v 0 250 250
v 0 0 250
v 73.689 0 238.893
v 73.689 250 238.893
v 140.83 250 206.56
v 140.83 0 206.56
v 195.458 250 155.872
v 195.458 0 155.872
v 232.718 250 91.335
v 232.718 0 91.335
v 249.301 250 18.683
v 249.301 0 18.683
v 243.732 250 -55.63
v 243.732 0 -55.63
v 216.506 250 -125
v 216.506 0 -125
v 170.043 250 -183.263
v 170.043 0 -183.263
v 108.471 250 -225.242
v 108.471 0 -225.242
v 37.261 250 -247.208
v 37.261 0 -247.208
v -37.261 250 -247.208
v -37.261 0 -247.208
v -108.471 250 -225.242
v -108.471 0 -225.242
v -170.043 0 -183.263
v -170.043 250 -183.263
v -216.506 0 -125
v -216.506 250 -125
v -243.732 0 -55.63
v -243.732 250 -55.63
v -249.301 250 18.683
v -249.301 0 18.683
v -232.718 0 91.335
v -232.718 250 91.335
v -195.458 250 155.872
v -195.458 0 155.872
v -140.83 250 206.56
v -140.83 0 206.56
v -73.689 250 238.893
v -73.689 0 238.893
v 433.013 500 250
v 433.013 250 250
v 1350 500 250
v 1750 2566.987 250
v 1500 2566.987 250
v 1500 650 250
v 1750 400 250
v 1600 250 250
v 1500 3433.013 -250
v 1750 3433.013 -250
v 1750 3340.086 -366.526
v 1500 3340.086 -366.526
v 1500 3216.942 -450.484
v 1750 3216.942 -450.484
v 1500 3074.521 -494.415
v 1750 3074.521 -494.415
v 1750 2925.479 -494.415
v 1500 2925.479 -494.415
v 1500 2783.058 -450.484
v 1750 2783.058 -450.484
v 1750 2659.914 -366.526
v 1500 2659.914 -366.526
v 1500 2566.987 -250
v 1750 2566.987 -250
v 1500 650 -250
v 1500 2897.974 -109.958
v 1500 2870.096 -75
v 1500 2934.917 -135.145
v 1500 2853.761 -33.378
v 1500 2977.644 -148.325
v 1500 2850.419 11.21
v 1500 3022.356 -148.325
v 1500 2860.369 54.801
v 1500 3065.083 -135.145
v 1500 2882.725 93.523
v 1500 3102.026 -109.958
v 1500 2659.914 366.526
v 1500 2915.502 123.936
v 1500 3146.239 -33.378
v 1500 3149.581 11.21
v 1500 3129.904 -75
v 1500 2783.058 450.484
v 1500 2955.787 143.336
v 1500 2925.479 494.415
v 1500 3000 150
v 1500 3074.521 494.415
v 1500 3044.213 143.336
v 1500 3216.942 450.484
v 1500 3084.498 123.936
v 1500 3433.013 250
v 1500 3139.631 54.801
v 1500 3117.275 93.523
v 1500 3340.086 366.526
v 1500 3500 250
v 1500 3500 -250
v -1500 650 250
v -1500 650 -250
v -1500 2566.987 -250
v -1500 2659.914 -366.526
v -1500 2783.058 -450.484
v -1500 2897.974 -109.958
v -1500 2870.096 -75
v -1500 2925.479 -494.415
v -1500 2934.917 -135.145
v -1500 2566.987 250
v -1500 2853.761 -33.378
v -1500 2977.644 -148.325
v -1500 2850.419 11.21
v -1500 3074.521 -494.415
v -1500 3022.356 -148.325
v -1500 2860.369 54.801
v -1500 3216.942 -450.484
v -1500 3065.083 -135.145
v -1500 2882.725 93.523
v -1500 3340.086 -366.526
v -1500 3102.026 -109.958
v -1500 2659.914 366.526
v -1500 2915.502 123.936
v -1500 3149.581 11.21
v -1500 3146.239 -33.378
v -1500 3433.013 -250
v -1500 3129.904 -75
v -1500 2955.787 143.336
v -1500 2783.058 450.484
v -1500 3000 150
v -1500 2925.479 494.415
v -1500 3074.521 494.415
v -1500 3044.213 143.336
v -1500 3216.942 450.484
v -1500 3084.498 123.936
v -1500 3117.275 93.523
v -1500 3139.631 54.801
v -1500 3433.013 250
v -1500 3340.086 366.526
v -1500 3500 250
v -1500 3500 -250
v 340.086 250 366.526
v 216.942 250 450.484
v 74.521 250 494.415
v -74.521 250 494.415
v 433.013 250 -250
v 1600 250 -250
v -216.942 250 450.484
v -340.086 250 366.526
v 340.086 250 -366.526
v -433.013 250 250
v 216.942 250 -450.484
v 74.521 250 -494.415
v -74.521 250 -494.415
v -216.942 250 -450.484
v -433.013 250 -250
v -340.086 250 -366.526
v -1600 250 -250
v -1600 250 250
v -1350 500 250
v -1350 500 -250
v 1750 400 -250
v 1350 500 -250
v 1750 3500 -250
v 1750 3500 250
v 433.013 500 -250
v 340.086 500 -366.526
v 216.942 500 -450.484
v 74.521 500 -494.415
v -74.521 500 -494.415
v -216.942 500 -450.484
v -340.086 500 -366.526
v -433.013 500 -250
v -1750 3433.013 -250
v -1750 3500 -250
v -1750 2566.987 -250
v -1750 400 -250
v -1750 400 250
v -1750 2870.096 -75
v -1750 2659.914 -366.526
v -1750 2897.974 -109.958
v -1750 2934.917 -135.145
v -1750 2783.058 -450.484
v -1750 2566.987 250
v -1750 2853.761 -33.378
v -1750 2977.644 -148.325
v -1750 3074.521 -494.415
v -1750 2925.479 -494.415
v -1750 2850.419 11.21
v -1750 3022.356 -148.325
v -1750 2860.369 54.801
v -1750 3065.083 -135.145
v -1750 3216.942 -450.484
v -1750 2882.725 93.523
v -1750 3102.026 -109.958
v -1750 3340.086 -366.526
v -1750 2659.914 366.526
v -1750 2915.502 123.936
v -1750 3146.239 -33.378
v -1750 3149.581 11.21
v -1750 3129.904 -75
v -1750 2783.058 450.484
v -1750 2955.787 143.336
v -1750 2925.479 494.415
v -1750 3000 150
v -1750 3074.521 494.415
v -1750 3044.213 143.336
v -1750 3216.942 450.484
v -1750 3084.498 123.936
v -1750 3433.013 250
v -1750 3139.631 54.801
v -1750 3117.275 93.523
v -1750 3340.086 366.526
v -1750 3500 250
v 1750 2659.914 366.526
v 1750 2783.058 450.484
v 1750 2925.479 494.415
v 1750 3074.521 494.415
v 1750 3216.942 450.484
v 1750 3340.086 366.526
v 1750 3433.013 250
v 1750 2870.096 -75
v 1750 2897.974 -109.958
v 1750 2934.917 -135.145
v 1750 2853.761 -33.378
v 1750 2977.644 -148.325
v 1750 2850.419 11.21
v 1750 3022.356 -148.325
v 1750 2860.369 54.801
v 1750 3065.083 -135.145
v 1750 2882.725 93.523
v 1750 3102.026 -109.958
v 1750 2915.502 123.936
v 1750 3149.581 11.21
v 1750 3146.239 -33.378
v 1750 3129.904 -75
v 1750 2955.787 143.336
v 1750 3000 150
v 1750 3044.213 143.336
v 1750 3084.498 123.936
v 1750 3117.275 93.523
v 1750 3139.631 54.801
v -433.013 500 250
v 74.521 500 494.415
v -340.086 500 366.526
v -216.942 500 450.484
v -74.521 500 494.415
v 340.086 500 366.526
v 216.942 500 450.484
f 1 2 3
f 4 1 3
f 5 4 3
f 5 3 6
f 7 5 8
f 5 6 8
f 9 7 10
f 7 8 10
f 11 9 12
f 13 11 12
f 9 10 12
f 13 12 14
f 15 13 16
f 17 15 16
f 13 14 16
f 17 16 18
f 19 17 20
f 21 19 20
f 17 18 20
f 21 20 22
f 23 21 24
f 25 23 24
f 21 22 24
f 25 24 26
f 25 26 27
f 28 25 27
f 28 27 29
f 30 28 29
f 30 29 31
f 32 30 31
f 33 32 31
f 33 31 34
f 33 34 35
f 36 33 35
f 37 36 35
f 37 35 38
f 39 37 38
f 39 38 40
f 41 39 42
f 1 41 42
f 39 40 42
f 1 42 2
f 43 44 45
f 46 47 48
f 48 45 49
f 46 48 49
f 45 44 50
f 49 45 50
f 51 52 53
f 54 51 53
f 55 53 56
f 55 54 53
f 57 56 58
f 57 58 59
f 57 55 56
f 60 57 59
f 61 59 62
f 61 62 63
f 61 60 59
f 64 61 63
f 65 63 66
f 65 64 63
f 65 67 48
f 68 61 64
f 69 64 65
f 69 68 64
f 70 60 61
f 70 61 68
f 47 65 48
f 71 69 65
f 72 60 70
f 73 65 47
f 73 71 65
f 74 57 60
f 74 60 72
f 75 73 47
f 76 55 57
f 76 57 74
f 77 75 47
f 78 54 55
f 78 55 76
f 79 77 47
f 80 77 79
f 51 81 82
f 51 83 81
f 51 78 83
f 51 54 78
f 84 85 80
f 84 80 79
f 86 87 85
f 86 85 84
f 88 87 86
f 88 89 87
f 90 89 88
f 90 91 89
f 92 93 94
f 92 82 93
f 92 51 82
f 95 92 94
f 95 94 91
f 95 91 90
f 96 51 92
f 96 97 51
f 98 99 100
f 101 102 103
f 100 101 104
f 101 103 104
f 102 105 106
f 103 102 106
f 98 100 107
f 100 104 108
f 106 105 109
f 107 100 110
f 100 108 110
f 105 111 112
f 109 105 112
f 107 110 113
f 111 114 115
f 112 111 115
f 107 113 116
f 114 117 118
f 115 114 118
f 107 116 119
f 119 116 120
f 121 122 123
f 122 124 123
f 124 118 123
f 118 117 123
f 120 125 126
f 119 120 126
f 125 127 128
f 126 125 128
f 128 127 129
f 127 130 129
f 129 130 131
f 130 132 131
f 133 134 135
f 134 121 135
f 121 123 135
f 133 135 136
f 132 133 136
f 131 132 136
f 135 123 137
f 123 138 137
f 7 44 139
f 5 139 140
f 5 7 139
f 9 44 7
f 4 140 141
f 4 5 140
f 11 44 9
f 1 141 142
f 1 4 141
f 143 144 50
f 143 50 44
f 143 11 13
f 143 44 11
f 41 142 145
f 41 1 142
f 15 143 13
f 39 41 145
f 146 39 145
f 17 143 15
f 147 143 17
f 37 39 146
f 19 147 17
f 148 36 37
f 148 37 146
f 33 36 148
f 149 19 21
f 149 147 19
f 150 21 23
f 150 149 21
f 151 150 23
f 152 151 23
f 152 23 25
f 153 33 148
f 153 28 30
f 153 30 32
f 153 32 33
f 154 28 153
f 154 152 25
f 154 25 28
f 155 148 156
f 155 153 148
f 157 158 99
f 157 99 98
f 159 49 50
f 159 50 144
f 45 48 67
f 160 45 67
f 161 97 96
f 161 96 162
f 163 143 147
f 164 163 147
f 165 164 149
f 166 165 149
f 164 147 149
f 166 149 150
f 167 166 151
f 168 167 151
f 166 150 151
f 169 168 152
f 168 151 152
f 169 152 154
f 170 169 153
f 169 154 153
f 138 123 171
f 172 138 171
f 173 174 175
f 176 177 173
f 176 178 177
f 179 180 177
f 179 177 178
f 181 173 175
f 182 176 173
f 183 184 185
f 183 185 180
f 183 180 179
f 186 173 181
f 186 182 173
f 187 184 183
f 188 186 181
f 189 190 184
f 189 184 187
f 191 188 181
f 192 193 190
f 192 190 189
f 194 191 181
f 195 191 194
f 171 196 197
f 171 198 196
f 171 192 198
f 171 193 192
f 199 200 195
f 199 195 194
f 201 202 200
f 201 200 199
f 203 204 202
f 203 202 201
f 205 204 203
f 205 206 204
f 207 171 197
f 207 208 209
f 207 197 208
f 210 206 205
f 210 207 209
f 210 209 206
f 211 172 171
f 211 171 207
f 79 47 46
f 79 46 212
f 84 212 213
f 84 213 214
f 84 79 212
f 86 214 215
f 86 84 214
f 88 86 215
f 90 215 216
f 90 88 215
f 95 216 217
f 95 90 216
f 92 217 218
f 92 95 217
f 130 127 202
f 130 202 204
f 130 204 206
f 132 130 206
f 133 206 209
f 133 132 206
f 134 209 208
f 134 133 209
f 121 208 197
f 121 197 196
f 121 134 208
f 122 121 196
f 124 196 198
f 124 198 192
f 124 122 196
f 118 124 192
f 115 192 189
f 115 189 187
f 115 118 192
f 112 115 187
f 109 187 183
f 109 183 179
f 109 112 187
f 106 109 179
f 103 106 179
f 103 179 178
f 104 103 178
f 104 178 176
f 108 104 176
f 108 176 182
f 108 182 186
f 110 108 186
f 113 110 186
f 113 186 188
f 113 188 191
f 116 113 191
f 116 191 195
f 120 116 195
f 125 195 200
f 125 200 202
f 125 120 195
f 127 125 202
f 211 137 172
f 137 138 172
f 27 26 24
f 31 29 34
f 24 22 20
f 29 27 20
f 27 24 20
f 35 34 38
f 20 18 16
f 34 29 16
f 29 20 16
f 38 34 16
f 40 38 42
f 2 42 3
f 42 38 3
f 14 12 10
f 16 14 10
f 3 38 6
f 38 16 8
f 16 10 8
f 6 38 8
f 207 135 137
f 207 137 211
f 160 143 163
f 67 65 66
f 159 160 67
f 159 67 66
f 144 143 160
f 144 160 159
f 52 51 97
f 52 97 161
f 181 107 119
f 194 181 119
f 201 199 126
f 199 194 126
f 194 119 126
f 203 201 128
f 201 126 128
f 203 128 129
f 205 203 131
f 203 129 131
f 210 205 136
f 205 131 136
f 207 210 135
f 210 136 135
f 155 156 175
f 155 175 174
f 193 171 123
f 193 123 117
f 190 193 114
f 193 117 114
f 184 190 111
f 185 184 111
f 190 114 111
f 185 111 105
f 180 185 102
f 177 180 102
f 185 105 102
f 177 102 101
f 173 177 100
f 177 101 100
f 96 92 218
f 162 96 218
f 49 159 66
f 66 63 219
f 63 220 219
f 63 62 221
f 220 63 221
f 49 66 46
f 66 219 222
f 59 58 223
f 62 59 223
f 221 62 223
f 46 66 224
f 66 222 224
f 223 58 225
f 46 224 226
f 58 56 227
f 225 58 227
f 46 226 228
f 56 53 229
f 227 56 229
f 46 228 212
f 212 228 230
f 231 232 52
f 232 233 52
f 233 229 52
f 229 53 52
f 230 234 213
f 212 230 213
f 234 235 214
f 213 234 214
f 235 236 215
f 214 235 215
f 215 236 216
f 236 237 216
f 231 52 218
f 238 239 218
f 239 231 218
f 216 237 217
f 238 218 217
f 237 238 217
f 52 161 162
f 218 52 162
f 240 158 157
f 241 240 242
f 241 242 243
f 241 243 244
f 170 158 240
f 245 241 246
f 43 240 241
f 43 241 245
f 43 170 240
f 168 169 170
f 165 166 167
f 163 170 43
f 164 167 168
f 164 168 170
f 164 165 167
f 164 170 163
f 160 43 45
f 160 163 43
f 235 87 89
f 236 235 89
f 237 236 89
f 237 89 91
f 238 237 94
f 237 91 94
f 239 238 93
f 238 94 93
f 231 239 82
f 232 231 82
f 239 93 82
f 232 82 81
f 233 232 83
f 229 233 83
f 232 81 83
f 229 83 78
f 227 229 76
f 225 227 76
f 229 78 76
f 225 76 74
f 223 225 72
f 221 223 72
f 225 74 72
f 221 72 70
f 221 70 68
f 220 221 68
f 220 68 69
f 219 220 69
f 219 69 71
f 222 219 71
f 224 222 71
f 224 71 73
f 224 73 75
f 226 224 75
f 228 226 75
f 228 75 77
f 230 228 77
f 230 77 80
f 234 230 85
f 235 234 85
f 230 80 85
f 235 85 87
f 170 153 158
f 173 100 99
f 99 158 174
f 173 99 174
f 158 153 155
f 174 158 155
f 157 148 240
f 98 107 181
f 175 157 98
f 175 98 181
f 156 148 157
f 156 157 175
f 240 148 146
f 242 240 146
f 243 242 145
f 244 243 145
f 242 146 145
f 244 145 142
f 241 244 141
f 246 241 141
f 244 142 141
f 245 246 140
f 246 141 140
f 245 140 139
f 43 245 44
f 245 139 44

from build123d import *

# Parameters (mm, degrees)
SKETCH1_R           = 250
BOSS_EXTRUDE1_DEPTH = 250
BOSS_EXTRUDE2_DEPTH = 250
SKETCH4_W           = 250
SKETCH4_H           = 500
BOSS_EXTRUDE3_DEPTH = 3250
SKETCH7_R           = 500
BOSS_EXTRUDE4_DEPTH = 250
SKETCH8_R           = 150
CUT_EXTRUDE1_DEPTH  = 250
CHAMFER1_SIZE       = 150


with BuildPart() as part:
    # Sketch1 → Boss-Extrude1 (new body)
    with BuildSketch(Plane(origin=(0, 0, 0), x_dir=(1, 0, 0), z_dir=(0, 1, 0))):
        with Locations(Location((0, 0, 0), (0, 0, 270))):
            Circle(SKETCH1_R)
    extrude(amount=BOSS_EXTRUDE1_DEPTH)

    # Sketch2 → Boss-Extrude2 (add)
    with BuildSketch(Plane(origin=(0, 250, 0), x_dir=(1, 0, 0), z_dir=(0, 1, 0))):
        with BuildLine():
            Line((-433.012701892, 250), (-1500, 250))
            Line((-1500, 250), (-1500, -250))
            Line((-1500, -250), (-433.012701892, -250))
            ThreePointArc((-433.012701892, -250), (0, -500), (433.012701892, -250))
            Line((433.012701892, -250), (1500, -250))
            Line((1500, -250), (1500, 250))
            Line((1500, 250), (433.012701892, 250))
            ThreePointArc((433.012701892, 250), (0, 500), (-433.012701892, 250))
        make_face()
    extrude(amount=BOSS_EXTRUDE2_DEPTH)

    # Sketch4 → Boss-Extrude3 (add)
    with BuildSketch(Plane(origin=(0, 250, 0), x_dir=(1, 0, 0), z_dir=(0, 1, 0))):
        with Locations((1625, 0)):
            Rectangle(SKETCH4_W, SKETCH4_H)
    boss_extrude3 = extrude(amount=BOSS_EXTRUDE3_DEPTH)

    # Sketch7 → Boss-Extrude4 (add)
    with BuildSketch(Plane.ZY.offset(-1500)):
        with Locations((0, 3000)):
            Circle(SKETCH7_R)
    boss_extrude4 = extrude(amount=-BOSS_EXTRUDE4_DEPTH)

    # Sketch8 → Cut-Extrude1 (cut)
    with BuildSketch(Plane.ZY.offset(-1500)):
        with Locations((0, 3000)):
            Circle(SKETCH8_R)
    cut_extrude1 = extrude(amount=-CUT_EXTRUDE1_DEPTH, mode=Mode.SUBTRACT)

    # Mirror1: Boss-Extrude3, Boss-Extrude4, Cut-Extrude1 across plane
    add(boss_extrude3.mirror(Plane(origin=(0, 0, 0), x_dir=(0, 0, 1), z_dir=(1, 0, 0))))
    add(boss_extrude4.mirror(Plane(origin=(0, 0, 0), x_dir=(0, 0, 1), z_dir=(1, 0, 0))))
    add(cut_extrude1.mirror(Plane(origin=(0, 0, 0), x_dir=(0, 0, 1), z_dir=(1, 0, 0))), mode=Mode.SUBTRACT)

    # Chamfer1
    chamfer1_edges = [part.edges().sort_by_distance(p)[0] for p in [
        (1500, 500, 0),
        (-1500, 500, 0),
        (1750, 250, 0),
        (-1750, 250, 0),
    ]]
    chamfer(chamfer1_edges, length=CHAMFER1_SIZE)


solid = part.part
